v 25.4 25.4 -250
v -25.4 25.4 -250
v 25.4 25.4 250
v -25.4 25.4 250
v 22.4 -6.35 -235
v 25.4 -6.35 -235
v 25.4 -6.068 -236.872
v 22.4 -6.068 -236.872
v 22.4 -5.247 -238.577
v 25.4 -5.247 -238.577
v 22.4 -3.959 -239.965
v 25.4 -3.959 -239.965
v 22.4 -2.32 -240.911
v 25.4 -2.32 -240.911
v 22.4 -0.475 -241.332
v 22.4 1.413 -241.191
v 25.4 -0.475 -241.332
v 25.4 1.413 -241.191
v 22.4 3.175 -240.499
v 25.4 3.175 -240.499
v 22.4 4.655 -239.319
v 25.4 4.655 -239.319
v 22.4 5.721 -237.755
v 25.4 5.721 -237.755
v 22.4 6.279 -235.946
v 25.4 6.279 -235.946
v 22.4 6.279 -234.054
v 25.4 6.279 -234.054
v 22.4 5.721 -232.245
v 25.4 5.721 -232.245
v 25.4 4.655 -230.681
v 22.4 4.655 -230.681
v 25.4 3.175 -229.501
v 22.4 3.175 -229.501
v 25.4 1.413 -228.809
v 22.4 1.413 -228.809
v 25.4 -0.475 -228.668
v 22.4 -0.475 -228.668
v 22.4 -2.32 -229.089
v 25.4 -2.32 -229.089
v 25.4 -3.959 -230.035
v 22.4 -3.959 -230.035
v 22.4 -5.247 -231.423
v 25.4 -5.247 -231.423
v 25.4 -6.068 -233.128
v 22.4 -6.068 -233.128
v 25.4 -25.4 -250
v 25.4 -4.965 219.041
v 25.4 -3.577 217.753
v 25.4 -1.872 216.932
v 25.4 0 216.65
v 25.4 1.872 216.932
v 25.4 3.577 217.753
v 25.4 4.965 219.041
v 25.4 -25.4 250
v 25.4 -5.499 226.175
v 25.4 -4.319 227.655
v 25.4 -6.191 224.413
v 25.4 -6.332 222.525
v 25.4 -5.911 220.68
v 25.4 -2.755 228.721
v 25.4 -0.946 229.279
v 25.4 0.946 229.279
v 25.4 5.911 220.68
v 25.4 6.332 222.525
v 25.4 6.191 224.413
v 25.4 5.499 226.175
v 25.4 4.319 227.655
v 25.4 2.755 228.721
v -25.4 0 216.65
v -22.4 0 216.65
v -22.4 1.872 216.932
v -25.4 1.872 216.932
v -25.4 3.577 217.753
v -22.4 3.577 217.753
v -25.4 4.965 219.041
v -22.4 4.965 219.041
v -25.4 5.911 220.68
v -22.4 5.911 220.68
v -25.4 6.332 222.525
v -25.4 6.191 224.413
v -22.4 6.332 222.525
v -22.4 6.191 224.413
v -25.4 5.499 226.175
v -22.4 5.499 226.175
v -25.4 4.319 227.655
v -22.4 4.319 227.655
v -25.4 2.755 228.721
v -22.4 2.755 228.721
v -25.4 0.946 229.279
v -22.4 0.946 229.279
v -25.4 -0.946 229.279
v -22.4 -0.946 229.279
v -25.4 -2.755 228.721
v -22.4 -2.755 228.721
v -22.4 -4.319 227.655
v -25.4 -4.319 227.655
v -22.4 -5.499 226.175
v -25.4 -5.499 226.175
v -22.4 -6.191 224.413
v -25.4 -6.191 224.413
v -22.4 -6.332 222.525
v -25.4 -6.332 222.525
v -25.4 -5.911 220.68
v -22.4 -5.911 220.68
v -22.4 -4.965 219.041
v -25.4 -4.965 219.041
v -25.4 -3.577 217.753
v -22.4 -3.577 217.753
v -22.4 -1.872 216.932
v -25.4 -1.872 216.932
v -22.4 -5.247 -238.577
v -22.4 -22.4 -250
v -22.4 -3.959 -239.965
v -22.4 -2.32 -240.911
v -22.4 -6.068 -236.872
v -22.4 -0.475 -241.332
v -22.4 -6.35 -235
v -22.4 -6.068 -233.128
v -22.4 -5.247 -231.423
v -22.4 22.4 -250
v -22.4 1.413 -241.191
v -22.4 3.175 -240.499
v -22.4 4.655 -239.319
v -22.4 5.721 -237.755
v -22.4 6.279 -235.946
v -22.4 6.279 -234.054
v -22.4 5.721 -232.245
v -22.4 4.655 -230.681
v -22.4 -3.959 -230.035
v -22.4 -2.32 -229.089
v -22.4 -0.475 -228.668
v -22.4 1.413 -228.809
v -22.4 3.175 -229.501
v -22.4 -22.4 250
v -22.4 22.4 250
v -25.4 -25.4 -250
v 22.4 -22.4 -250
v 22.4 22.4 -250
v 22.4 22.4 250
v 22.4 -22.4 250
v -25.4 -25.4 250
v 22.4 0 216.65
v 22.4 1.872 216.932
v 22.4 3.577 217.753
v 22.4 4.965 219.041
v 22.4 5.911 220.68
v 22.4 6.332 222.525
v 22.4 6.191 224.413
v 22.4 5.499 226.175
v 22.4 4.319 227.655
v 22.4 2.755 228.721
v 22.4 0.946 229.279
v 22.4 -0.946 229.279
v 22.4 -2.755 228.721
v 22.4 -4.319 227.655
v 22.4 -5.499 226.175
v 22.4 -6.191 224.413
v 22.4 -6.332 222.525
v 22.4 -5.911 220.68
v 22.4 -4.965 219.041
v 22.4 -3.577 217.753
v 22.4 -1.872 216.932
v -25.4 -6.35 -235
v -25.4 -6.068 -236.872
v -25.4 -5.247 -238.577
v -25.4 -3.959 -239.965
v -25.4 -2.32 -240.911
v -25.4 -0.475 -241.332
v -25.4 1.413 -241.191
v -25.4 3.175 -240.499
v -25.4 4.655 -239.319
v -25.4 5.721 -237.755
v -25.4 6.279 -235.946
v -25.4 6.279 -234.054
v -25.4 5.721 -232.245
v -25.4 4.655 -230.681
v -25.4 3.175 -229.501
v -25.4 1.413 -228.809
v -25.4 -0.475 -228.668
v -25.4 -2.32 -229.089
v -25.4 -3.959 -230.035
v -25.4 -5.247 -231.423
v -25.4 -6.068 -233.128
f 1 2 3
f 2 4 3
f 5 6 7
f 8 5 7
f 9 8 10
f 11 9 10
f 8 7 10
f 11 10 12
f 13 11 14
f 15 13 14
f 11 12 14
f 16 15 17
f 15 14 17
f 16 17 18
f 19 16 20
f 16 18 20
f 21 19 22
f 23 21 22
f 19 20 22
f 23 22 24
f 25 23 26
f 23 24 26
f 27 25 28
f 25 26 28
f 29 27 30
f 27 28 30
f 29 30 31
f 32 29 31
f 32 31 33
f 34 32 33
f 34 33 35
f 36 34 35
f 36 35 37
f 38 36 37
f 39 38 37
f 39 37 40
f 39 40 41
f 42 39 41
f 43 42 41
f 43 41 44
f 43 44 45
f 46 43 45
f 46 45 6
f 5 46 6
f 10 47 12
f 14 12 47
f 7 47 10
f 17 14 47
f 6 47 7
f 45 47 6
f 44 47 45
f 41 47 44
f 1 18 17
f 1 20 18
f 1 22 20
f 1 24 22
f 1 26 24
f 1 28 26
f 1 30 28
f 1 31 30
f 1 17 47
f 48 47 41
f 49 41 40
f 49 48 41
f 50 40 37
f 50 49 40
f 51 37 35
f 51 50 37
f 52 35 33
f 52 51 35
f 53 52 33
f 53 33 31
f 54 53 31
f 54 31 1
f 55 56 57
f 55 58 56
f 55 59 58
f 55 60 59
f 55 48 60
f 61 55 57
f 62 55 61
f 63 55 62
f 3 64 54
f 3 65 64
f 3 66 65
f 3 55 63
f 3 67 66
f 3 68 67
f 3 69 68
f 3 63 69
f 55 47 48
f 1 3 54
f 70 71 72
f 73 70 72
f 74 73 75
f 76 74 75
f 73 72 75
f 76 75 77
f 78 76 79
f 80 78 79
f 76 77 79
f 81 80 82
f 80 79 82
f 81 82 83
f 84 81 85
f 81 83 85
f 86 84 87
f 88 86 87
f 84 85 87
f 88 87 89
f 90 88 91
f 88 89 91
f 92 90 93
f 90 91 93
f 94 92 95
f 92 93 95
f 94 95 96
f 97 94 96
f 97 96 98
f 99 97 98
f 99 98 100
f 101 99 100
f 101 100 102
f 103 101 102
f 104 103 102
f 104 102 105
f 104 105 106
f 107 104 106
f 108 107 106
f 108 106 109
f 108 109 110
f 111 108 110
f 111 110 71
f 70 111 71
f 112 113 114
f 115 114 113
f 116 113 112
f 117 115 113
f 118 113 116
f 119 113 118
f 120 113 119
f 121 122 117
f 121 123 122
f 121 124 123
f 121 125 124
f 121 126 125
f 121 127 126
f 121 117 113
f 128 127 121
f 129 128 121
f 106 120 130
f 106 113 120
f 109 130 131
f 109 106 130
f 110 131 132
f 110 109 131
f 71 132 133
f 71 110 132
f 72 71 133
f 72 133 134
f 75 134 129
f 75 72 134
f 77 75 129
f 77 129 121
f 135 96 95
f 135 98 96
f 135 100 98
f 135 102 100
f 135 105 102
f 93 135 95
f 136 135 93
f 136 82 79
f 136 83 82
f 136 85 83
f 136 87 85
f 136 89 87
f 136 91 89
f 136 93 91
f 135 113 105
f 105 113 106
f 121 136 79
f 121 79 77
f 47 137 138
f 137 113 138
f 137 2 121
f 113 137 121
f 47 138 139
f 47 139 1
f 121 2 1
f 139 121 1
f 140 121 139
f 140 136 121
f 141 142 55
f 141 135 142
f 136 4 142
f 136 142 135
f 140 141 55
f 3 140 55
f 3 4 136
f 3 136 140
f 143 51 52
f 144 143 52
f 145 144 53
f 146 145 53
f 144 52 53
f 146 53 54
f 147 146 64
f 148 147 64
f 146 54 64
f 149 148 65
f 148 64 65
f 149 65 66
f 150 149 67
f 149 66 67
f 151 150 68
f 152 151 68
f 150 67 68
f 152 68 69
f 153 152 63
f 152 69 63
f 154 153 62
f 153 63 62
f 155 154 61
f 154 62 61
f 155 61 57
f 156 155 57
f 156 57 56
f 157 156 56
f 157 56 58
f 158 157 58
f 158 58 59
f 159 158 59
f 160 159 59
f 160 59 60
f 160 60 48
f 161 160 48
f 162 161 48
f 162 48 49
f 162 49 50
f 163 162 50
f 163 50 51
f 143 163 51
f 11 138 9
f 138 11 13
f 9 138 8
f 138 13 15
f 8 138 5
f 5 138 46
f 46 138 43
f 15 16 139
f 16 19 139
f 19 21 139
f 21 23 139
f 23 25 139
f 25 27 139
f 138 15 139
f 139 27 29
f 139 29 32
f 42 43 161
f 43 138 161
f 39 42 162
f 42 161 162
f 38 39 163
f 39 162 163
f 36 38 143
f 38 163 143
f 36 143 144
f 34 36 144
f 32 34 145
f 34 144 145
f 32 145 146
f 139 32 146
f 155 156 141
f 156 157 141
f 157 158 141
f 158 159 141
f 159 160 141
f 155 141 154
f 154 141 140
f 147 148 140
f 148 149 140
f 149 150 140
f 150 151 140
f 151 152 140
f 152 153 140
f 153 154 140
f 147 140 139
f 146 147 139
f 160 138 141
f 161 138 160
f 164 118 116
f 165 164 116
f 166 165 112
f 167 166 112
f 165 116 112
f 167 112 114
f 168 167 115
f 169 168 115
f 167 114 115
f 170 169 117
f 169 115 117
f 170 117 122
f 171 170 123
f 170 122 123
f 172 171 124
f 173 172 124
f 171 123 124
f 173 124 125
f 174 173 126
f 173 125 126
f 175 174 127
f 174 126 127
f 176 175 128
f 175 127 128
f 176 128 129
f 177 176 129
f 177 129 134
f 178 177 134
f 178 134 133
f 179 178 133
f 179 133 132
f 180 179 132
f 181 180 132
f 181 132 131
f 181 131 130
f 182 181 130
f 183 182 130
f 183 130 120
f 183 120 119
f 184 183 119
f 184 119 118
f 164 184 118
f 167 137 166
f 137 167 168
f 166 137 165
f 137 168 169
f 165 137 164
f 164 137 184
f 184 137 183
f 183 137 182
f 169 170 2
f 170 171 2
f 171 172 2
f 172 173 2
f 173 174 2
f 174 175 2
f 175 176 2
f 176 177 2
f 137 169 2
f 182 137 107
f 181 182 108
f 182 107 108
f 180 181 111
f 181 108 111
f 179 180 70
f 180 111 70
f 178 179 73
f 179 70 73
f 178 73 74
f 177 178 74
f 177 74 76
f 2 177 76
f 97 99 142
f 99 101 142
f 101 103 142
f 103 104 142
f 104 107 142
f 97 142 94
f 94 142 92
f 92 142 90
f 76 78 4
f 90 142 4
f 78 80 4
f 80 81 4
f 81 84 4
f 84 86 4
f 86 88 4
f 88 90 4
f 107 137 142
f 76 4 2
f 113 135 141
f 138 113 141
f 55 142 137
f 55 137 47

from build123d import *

# Parameters (mm, degrees)
CROQUIS1_W              = 50.8
CROQUIS1_H              = 50.8
CROQUIS1_W_2            = 44.8
CROQUIS1_H_2            = 44.8
SALIENTE_EXTRUIR1_DEPTH = 250
CROQUIS2_R              = 6.35
CORTAR_EXTRUIR1_DEPTH   = 257.370435113


with BuildPart() as part:
    # Croquis1 → Saliente-Extruir1 (new, symmetric)
    with BuildSketch(Plane.XY):
        Rectangle(CROQUIS1_W, CROQUIS1_H)
        Rectangle(CROQUIS1_W_2, CROQUIS1_H_2, mode=Mode.SUBTRACT)
    extrude(amount=SALIENTE_EXTRUIR1_DEPTH, both=True)

    # Croquis2 → Cortar-Extruir1 (cut, through all)
    with BuildSketch(Plane(origin=(25.4, 0, 0), x_dir=(0, 0, -1), z_dir=(1, 0, 0))):
        with Locations((-223, 0)):
            Circle(CROQUIS2_R)
        with Locations(Location((235, 0, 0), (0, 0, 270))):
            Circle(CROQUIS2_R)
    extrude(amount=-CORTAR_EXTRUIR1_DEPTH, mode=Mode.SUBTRACT)


solid = part.part
